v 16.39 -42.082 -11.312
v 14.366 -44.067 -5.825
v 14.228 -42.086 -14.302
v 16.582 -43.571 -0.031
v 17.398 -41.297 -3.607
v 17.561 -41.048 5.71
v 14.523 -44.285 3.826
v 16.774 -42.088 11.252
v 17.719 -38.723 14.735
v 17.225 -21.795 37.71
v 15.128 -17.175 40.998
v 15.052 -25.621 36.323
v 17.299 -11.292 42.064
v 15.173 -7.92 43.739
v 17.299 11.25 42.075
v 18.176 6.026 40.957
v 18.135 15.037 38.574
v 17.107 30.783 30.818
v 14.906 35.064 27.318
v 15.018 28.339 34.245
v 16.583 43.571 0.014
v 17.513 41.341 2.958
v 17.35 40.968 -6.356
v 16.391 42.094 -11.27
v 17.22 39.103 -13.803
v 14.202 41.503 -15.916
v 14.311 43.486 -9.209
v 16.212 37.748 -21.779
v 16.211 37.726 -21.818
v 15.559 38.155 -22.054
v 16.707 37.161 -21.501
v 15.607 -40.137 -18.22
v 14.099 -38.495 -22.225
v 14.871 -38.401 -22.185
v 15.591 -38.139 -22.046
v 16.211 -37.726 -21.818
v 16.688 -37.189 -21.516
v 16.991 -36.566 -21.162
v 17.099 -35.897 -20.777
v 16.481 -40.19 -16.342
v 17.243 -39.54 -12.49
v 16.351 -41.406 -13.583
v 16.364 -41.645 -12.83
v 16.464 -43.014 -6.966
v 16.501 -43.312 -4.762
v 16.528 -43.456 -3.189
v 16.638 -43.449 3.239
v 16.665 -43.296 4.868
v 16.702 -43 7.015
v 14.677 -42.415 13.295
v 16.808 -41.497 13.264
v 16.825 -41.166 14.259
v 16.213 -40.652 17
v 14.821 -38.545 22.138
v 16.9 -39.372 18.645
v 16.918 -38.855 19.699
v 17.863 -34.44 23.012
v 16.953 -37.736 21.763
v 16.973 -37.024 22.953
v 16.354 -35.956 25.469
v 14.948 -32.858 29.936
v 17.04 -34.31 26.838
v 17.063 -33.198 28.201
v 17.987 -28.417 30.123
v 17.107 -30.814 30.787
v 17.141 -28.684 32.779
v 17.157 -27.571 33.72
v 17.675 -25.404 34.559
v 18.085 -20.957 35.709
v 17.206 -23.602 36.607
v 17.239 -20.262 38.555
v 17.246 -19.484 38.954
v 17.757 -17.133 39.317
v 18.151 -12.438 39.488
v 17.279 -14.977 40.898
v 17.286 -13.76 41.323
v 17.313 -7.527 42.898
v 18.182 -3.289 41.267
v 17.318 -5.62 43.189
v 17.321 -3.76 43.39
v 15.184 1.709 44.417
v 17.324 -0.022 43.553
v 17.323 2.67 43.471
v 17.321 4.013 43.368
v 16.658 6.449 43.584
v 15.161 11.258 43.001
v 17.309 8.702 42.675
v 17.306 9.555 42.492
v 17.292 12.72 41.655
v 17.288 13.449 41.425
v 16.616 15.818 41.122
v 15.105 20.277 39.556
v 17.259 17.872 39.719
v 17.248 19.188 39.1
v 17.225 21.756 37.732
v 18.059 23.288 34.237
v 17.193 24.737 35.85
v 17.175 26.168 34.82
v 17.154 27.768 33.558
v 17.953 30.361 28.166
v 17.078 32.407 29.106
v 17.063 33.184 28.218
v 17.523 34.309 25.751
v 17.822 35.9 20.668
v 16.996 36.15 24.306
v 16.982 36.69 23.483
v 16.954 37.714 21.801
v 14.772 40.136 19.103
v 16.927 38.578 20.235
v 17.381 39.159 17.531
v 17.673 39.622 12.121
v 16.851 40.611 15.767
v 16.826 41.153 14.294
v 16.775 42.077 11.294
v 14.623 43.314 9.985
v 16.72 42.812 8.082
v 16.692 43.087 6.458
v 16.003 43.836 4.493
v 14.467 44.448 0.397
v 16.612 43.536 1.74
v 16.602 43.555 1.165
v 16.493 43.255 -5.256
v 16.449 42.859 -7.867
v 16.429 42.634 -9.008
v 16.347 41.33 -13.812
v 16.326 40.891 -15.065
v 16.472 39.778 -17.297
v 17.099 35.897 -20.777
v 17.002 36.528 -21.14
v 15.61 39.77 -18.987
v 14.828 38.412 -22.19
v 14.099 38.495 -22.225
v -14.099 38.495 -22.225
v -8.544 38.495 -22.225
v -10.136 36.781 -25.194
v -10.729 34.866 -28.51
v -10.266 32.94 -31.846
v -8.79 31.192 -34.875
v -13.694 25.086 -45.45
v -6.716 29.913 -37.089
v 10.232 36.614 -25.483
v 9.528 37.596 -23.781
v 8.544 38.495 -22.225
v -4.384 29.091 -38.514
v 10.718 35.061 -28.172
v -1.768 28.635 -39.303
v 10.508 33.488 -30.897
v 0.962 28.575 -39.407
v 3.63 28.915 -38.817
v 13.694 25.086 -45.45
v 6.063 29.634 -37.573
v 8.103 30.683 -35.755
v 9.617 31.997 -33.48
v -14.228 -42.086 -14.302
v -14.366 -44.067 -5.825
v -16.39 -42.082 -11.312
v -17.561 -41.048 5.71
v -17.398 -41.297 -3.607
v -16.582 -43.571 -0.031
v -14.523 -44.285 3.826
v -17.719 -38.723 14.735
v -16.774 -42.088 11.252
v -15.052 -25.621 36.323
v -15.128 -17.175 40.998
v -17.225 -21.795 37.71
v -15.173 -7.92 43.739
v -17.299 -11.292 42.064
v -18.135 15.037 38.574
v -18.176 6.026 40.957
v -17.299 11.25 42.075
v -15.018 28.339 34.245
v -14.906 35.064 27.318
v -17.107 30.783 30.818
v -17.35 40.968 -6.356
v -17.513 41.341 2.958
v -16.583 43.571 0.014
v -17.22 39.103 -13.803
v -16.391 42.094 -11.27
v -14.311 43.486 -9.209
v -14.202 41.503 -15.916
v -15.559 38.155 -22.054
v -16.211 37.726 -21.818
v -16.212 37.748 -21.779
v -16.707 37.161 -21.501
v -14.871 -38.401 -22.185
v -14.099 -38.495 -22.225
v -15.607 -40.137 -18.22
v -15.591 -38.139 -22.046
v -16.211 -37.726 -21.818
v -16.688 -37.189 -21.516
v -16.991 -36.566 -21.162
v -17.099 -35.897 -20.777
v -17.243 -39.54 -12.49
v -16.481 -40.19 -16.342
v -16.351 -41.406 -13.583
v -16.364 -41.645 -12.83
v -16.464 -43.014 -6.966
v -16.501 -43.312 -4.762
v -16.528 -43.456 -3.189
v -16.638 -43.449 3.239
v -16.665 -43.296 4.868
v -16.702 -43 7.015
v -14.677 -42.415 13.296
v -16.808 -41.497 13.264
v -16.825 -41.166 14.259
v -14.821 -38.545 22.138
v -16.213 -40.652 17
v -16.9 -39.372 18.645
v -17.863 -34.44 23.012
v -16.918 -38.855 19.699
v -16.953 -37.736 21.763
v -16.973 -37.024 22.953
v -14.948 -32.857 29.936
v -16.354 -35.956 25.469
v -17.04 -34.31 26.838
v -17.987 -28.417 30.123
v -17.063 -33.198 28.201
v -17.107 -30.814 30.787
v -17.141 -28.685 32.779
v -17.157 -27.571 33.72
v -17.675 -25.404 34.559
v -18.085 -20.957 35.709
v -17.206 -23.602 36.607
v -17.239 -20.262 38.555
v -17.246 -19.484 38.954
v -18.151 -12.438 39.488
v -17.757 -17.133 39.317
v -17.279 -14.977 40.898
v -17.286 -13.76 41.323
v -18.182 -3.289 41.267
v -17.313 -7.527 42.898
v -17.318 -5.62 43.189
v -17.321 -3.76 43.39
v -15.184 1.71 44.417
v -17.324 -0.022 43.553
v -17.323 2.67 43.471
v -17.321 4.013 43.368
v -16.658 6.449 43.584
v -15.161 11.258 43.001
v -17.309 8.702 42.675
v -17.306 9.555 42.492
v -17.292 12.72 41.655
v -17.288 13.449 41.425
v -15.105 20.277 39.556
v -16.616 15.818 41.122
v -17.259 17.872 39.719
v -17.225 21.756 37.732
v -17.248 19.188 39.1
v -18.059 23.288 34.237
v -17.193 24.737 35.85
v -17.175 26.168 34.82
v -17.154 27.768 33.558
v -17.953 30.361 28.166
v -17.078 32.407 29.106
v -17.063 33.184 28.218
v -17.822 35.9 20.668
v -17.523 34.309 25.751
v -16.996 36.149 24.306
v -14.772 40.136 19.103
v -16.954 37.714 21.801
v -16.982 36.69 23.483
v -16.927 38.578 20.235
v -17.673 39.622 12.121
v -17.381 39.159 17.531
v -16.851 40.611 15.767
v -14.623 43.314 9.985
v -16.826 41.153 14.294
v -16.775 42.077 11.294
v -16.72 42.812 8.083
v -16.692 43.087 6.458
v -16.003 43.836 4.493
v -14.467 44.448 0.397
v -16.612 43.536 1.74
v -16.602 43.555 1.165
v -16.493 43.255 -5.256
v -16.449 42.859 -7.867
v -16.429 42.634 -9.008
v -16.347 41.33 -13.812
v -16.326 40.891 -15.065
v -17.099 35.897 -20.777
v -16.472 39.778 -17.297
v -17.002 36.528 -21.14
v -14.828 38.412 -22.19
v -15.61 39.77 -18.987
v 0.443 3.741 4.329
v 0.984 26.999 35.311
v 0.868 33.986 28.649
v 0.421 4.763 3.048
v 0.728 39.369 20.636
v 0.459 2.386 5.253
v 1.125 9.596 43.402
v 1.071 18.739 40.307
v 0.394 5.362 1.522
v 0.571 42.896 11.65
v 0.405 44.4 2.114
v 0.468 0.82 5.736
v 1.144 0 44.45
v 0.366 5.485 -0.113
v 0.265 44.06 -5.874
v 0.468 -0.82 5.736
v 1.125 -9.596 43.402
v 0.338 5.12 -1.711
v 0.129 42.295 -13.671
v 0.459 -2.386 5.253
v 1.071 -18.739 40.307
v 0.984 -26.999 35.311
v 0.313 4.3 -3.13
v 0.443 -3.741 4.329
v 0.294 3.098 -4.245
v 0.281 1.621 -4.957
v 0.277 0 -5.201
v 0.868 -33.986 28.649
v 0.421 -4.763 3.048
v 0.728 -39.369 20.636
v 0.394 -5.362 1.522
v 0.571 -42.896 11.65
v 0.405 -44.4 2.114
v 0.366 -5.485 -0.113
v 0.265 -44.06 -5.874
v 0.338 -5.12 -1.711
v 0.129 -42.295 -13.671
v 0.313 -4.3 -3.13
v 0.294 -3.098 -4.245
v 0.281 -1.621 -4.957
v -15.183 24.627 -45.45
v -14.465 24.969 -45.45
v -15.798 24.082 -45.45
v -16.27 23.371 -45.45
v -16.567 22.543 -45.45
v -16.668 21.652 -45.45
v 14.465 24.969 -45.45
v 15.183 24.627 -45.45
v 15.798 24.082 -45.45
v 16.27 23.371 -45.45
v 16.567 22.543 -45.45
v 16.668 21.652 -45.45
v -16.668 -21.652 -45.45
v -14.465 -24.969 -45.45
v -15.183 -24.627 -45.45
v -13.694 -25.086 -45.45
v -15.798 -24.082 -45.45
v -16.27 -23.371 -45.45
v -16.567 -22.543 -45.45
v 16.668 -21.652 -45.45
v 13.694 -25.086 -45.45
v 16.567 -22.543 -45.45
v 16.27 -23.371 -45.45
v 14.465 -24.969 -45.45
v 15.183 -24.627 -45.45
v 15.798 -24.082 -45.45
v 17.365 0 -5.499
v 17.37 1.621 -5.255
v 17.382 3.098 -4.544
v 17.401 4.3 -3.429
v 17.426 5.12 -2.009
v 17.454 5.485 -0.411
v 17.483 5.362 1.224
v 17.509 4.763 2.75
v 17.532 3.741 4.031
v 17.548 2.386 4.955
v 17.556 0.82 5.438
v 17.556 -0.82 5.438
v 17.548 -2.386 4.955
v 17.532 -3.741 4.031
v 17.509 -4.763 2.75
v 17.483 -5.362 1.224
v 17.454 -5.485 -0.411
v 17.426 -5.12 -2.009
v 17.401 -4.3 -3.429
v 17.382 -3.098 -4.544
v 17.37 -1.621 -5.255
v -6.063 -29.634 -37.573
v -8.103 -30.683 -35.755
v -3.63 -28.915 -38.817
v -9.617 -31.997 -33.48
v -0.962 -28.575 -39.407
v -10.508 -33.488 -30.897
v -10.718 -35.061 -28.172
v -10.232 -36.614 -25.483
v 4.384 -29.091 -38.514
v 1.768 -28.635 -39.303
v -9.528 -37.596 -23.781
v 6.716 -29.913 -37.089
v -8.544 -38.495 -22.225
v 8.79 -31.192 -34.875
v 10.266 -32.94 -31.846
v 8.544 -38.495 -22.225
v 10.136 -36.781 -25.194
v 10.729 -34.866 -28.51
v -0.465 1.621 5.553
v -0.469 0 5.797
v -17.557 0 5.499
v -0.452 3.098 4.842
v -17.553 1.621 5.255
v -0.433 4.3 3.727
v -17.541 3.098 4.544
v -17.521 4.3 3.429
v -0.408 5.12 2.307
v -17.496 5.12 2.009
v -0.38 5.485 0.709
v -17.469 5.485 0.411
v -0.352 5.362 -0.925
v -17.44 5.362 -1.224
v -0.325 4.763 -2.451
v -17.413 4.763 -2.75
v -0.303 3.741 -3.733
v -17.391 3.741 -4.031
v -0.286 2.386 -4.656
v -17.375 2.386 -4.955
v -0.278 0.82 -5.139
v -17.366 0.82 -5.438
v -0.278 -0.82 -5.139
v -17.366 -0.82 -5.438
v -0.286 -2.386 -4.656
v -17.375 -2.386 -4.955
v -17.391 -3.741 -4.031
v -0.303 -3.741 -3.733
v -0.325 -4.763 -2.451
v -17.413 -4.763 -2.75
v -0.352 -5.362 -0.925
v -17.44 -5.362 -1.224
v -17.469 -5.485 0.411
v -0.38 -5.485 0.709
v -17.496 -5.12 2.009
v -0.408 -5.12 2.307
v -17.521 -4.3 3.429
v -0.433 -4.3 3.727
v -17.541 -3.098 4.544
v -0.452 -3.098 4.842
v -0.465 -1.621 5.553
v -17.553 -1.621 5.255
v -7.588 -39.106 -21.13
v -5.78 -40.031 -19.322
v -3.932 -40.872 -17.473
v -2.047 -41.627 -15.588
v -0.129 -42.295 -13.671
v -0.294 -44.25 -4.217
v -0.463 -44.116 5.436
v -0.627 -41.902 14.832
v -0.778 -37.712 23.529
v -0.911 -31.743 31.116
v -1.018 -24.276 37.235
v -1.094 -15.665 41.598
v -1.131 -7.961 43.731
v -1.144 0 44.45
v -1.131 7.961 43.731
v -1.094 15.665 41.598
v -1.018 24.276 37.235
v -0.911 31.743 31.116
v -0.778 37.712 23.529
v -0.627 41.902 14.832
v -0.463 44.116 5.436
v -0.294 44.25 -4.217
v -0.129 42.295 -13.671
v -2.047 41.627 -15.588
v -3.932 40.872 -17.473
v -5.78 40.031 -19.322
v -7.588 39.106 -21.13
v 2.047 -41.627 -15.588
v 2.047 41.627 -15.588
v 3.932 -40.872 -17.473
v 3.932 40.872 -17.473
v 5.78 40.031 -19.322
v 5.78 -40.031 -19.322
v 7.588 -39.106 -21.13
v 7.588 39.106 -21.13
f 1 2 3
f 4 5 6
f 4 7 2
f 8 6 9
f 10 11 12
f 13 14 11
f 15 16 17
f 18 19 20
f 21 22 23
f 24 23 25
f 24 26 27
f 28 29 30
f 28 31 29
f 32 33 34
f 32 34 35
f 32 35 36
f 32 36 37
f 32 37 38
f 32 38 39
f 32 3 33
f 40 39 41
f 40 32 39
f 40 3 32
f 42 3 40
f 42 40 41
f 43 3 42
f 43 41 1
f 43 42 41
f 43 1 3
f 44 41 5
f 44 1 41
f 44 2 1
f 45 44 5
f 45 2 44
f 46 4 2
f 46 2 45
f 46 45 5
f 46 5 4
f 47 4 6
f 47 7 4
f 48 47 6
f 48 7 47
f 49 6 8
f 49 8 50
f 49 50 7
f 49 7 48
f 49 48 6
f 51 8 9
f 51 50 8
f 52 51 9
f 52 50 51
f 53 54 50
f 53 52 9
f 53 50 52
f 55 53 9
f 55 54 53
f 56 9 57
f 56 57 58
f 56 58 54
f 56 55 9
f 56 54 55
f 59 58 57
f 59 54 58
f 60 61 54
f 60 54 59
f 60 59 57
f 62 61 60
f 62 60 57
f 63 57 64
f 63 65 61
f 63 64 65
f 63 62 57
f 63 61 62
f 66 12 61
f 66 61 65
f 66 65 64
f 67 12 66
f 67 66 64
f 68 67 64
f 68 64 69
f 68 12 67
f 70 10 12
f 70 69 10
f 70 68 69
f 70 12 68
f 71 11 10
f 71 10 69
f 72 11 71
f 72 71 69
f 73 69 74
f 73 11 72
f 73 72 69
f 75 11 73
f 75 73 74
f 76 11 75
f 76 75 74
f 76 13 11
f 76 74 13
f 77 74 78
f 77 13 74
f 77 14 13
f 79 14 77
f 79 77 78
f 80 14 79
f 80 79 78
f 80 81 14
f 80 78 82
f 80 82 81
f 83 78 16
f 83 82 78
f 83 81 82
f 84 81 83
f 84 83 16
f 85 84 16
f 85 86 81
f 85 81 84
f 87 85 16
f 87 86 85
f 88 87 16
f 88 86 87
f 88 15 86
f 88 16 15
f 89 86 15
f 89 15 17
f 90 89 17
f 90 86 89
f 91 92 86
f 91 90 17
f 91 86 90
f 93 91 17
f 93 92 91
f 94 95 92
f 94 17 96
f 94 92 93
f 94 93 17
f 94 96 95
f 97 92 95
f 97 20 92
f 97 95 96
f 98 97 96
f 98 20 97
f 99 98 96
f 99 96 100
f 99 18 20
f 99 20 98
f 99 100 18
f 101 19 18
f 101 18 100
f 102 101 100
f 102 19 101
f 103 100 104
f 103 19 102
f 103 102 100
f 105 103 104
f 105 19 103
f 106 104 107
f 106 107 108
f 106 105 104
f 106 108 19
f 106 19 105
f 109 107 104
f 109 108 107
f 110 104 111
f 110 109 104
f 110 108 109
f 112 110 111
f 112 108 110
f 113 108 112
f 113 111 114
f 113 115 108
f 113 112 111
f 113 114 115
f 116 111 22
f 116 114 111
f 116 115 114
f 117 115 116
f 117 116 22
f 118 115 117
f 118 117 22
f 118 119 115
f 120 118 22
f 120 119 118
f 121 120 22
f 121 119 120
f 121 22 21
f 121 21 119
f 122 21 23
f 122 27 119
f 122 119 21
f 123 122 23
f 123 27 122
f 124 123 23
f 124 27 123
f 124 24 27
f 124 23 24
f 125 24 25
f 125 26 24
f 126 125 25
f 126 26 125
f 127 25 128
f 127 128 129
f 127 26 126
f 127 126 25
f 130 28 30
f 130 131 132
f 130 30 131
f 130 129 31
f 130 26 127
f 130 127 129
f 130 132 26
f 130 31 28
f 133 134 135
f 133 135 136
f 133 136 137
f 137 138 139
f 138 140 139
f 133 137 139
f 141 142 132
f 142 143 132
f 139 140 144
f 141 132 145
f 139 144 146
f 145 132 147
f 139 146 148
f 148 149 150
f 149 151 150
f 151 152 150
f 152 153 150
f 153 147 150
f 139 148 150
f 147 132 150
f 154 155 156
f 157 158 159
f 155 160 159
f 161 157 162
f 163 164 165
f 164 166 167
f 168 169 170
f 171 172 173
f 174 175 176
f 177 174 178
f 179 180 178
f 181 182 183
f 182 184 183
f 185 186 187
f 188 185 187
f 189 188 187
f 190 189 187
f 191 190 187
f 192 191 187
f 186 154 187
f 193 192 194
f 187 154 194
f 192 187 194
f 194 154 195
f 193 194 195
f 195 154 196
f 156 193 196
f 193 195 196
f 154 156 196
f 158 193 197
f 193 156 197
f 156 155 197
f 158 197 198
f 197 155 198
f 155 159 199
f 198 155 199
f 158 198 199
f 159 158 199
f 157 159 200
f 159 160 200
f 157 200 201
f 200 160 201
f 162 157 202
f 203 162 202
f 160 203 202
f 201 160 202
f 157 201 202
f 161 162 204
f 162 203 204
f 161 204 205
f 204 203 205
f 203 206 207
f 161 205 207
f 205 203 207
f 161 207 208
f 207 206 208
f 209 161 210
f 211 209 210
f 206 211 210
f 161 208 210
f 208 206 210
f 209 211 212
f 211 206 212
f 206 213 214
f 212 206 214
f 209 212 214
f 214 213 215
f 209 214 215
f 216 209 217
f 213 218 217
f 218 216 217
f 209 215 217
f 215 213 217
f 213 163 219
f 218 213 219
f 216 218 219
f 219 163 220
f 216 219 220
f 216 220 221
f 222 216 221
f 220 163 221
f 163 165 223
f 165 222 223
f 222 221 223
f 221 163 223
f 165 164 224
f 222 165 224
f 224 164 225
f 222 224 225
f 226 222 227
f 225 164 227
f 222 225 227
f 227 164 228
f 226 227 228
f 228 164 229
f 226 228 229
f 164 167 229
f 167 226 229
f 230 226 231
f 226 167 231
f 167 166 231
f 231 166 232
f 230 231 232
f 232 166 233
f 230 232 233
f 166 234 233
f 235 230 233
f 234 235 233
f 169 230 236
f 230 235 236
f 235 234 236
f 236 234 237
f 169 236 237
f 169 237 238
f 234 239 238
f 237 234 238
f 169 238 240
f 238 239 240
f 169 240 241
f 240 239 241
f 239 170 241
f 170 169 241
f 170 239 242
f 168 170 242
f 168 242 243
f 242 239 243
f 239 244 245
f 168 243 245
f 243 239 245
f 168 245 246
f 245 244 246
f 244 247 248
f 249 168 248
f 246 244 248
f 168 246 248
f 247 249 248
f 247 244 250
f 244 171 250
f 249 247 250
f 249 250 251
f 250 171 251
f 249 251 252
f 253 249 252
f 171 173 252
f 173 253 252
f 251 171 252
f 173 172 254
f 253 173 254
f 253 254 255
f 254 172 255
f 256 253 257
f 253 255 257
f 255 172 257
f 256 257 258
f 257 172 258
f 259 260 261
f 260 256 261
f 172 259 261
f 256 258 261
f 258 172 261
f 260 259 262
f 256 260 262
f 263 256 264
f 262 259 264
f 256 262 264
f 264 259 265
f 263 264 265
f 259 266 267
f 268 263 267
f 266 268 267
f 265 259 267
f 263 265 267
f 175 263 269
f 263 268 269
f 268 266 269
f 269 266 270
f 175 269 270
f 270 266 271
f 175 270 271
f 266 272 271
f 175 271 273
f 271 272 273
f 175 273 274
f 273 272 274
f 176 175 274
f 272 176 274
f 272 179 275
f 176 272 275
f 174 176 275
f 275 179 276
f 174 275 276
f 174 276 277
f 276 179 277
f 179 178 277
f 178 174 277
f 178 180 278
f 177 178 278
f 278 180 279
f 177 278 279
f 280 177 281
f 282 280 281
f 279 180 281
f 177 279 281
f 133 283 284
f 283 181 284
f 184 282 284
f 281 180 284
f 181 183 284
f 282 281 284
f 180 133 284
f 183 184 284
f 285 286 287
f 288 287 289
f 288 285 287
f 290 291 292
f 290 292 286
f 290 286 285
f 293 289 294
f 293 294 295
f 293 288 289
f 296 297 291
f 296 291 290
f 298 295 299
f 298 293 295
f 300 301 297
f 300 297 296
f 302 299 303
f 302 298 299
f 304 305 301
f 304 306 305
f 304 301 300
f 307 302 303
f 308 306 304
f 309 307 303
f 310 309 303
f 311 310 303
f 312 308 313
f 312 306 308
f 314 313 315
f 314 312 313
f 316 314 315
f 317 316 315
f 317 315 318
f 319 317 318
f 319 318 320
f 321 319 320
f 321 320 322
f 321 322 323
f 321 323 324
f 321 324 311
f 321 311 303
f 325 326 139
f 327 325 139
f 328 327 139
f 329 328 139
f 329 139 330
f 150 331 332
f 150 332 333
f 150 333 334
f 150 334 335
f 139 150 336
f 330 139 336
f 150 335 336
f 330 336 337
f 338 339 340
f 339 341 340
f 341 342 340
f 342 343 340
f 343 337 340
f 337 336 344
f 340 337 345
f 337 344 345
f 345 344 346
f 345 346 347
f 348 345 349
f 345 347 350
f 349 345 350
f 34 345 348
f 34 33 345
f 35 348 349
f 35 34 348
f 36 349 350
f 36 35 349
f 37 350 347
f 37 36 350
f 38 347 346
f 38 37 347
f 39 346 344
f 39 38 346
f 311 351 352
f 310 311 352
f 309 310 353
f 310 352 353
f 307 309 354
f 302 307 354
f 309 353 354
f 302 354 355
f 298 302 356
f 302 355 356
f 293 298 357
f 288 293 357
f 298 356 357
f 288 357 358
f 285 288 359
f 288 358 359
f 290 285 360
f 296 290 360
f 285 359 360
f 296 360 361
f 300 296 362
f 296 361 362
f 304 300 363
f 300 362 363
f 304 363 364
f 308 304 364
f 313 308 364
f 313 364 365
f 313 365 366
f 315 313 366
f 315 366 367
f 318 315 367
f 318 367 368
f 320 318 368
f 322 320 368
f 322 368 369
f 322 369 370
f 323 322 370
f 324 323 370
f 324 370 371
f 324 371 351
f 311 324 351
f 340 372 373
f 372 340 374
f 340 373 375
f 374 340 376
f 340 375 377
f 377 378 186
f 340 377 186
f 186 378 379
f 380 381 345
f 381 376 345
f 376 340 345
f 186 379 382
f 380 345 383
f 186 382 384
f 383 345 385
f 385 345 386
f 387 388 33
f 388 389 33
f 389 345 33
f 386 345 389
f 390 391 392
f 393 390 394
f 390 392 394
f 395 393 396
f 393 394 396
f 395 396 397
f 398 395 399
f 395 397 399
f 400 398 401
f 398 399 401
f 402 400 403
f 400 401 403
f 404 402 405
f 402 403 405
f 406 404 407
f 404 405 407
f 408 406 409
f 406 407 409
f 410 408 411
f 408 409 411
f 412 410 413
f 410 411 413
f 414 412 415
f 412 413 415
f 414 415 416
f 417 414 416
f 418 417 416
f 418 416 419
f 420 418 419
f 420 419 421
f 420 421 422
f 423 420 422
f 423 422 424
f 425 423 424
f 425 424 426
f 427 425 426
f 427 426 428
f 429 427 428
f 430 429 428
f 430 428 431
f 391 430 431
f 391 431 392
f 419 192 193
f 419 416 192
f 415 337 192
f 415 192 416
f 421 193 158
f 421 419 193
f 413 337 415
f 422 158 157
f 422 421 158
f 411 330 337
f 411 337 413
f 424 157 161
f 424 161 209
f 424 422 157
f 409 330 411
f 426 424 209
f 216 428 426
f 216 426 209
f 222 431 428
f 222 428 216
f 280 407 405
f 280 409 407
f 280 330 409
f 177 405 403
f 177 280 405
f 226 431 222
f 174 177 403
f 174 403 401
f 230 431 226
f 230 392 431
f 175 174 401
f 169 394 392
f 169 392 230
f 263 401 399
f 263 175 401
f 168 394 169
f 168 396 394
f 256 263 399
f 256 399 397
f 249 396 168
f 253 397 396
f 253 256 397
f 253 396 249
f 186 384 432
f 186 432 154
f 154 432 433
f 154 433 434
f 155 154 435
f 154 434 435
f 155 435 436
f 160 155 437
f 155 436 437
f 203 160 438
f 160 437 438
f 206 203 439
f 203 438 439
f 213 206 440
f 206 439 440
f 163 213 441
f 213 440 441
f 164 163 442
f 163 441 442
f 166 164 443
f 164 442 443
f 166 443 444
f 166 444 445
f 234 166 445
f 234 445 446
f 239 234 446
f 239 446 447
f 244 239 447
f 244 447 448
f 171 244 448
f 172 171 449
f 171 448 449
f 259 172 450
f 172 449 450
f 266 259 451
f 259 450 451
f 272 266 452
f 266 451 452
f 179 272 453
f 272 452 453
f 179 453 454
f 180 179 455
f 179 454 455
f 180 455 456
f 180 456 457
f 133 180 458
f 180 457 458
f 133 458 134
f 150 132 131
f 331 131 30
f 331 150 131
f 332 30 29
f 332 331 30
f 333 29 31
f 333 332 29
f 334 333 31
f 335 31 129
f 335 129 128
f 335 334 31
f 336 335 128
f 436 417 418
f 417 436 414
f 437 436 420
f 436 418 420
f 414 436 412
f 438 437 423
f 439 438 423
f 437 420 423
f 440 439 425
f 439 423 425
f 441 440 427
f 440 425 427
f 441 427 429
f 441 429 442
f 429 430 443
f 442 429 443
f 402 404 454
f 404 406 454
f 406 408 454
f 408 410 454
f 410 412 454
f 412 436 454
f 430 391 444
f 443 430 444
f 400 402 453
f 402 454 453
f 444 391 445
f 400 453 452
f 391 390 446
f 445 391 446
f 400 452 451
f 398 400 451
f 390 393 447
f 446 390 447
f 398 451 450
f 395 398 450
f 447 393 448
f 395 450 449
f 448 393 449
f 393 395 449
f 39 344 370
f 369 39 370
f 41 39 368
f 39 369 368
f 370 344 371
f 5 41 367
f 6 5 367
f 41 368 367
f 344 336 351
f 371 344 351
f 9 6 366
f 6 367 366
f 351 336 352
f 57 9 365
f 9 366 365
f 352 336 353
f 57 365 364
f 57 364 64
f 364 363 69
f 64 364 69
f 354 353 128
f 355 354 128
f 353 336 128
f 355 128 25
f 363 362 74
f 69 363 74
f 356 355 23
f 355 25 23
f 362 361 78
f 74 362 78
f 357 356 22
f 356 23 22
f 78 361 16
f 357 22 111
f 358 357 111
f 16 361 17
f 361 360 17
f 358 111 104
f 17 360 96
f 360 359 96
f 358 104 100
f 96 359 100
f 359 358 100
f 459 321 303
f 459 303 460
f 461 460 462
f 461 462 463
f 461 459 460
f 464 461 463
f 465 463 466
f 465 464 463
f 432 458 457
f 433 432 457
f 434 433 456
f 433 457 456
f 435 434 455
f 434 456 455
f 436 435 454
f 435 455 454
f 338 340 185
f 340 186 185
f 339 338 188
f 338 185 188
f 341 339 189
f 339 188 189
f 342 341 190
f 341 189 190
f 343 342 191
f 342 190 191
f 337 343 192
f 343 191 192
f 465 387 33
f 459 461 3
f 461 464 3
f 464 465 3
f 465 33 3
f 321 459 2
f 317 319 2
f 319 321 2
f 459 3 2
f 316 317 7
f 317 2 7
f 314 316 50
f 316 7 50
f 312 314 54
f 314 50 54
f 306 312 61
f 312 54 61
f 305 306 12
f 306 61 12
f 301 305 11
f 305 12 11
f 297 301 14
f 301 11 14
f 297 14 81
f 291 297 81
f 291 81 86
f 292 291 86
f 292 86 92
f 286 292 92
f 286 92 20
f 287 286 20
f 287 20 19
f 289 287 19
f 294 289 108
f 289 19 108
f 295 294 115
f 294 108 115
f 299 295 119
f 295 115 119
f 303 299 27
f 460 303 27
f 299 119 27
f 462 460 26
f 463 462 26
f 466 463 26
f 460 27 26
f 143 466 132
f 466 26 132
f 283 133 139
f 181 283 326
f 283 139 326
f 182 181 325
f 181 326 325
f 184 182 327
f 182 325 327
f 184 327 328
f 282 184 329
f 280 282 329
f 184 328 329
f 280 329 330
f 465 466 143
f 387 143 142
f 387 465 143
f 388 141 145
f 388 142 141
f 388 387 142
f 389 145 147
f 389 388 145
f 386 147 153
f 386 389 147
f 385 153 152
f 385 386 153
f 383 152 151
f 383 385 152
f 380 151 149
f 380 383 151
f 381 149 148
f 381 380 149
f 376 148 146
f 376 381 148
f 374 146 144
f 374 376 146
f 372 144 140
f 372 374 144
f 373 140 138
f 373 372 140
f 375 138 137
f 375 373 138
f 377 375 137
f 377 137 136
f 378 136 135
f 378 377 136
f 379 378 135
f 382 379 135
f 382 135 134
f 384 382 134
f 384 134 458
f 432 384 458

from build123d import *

# Parameters (mm, degrees)
BOSS_EXTRUDE1_DEPTH     = 16.668
CUT_EXTRUDE1_DEPTH      = 45.45
CUT_EXTRUDE1_DEPTH_BACK = 45.45
DRAFT1_ANGLE            = 1
CUT_EXTRUDE2_REACH      = 38.469
SKETCH3_R               = 5.5
CUT_EXTRUDE4_REACH      = 38.469
SKETCH5_R               = 5.5
FILLET1_R               = 3


with BuildPart() as part:
    # Sketch1 → Boss-Extrude1 (new body, symmetric)
    with BuildSketch(Plane(origin=(0, 0, 0), x_dir=(0, 0, -1), z_dir=(1, 0, 0))):
        with BuildLine():
            Line((22.225, 38.494829198), (45.45, 25.085869196))
            Line((45.45, 25.085869196), (45.45, -25.085869196))
            Line((45.45, -25.085869196), (22.225, -38.494829198))
            ThreePointArc((22.225, -38.494829198), (-44.45, 0), (22.225, 38.494829198))
        make_face()
    extrude(amount=BOSS_EXTRUDE1_DEPTH, both=True)

    # Sketch2 → Cut-Extrude1 (cut, two sides)
    with BuildSketch(Plane(origin=(0, 0, 0), x_dir=(1, 0, 0), z_dir=(0, 1, 0))) as cut_extrude1_sk:
        with BuildLine():
            Line((-7.588316422, 21.130183578), (-0.129046134, 13.670913289))
            Line((-0.129046134, 13.670913289), (-1.143550449, -44.45))
            Line((-1.143550449, -44.45), (1.143550449, -44.45))
            Line((1.143550449, -44.45), (0.129046134, 13.670913289))
            Line((0.129046134, 13.670913289), (7.588316422, 21.130183578))
            ThreePointArc((7.588316422, 21.130183578), (0, 39.45), (-7.588316422, 21.130183578))
        make_face()
    extrude(amount=CUT_EXTRUDE1_DEPTH, mode=Mode.SUBTRACT)
    extrude(cut_extrude1_sk.sketch, amount=-CUT_EXTRUDE1_DEPTH_BACK, mode=Mode.SUBTRACT)

    # Draft1
    draft1_faces = [part.faces().sort_by_distance(p)[0] for p in [
        (16.668, 0, -1.658648034),
        (-16.668, 0, -1.658648034),
    ]]
    draft(draft1_faces, Plane(origin=(16.668, 25.085869196, -45.45), x_dir=(-1, 0, 0), z_dir=(0, 0, -1)), DRAFT1_ANGLE)

    # Sketch3 → Cut-Extrude2 (cut, up to next)
    with BuildSketch(Plane(origin=(17.456014215, 0, -0.304695862), x_dir=(-0.017452406, 0, -0.999847695), z_dir=(0.999847695, 0, -0.017452406)), mode=Mode.PRIVATE) as cut_extrude2_sk1:
        with Locations((-0.304742275, 0)):
            Circle(SKETCH3_R)
    cut_extrude2_tool1 = extrude(cut_extrude2_sk1.sketch, amount=-CUT_EXTRUDE2_REACH, mode=Mode.PRIVATE) & part.part
    add(cut_extrude2_tool1.solids().sort_by_distance((17.461333, 0, 0))[0], mode=Mode.SUBTRACT)

    # Sketch5 → Cut-Extrude4 (cut, up to next)
    with BuildSketch(Plane(origin=(-17.456014215, 0, -0.304695862), x_dir=(-0.017452406, 0, 0.999847695), z_dir=(-0.999847695, 0, -0.017452406)), mode=Mode.PRIVATE) as cut_extrude4_sk1:
        with Locations((0.304742275, 0)):
            Circle(SKETCH5_R)
    cut_extrude4_tool1 = extrude(cut_extrude4_sk1.sketch, amount=-CUT_EXTRUDE4_REACH, mode=Mode.PRIVATE) & part.part
    add(cut_extrude4_tool1.solids().sort_by_distance((-17.461333, 0, 0))[0], mode=Mode.SUBTRACT)

    # Fillet1
    fillet1_edges = [part.edges().sort_by_distance(p)[0] for p in [
        (16.870696941, 31.790349197, -33.8375),
        (18.237210337, 0.000220739, 44.449999999),
        (-16.870696941, 31.790349197, -33.8375),
        (-16.870697084, -31.790353899, -33.837491856),
        (-18.237210337, 9.404e-06, 44.45),
        (16.870700278, -31.790459554, -33.837308856),
    ]]
    fillet(fillet1_edges, radius=FILLET1_R)


solid = part.part
